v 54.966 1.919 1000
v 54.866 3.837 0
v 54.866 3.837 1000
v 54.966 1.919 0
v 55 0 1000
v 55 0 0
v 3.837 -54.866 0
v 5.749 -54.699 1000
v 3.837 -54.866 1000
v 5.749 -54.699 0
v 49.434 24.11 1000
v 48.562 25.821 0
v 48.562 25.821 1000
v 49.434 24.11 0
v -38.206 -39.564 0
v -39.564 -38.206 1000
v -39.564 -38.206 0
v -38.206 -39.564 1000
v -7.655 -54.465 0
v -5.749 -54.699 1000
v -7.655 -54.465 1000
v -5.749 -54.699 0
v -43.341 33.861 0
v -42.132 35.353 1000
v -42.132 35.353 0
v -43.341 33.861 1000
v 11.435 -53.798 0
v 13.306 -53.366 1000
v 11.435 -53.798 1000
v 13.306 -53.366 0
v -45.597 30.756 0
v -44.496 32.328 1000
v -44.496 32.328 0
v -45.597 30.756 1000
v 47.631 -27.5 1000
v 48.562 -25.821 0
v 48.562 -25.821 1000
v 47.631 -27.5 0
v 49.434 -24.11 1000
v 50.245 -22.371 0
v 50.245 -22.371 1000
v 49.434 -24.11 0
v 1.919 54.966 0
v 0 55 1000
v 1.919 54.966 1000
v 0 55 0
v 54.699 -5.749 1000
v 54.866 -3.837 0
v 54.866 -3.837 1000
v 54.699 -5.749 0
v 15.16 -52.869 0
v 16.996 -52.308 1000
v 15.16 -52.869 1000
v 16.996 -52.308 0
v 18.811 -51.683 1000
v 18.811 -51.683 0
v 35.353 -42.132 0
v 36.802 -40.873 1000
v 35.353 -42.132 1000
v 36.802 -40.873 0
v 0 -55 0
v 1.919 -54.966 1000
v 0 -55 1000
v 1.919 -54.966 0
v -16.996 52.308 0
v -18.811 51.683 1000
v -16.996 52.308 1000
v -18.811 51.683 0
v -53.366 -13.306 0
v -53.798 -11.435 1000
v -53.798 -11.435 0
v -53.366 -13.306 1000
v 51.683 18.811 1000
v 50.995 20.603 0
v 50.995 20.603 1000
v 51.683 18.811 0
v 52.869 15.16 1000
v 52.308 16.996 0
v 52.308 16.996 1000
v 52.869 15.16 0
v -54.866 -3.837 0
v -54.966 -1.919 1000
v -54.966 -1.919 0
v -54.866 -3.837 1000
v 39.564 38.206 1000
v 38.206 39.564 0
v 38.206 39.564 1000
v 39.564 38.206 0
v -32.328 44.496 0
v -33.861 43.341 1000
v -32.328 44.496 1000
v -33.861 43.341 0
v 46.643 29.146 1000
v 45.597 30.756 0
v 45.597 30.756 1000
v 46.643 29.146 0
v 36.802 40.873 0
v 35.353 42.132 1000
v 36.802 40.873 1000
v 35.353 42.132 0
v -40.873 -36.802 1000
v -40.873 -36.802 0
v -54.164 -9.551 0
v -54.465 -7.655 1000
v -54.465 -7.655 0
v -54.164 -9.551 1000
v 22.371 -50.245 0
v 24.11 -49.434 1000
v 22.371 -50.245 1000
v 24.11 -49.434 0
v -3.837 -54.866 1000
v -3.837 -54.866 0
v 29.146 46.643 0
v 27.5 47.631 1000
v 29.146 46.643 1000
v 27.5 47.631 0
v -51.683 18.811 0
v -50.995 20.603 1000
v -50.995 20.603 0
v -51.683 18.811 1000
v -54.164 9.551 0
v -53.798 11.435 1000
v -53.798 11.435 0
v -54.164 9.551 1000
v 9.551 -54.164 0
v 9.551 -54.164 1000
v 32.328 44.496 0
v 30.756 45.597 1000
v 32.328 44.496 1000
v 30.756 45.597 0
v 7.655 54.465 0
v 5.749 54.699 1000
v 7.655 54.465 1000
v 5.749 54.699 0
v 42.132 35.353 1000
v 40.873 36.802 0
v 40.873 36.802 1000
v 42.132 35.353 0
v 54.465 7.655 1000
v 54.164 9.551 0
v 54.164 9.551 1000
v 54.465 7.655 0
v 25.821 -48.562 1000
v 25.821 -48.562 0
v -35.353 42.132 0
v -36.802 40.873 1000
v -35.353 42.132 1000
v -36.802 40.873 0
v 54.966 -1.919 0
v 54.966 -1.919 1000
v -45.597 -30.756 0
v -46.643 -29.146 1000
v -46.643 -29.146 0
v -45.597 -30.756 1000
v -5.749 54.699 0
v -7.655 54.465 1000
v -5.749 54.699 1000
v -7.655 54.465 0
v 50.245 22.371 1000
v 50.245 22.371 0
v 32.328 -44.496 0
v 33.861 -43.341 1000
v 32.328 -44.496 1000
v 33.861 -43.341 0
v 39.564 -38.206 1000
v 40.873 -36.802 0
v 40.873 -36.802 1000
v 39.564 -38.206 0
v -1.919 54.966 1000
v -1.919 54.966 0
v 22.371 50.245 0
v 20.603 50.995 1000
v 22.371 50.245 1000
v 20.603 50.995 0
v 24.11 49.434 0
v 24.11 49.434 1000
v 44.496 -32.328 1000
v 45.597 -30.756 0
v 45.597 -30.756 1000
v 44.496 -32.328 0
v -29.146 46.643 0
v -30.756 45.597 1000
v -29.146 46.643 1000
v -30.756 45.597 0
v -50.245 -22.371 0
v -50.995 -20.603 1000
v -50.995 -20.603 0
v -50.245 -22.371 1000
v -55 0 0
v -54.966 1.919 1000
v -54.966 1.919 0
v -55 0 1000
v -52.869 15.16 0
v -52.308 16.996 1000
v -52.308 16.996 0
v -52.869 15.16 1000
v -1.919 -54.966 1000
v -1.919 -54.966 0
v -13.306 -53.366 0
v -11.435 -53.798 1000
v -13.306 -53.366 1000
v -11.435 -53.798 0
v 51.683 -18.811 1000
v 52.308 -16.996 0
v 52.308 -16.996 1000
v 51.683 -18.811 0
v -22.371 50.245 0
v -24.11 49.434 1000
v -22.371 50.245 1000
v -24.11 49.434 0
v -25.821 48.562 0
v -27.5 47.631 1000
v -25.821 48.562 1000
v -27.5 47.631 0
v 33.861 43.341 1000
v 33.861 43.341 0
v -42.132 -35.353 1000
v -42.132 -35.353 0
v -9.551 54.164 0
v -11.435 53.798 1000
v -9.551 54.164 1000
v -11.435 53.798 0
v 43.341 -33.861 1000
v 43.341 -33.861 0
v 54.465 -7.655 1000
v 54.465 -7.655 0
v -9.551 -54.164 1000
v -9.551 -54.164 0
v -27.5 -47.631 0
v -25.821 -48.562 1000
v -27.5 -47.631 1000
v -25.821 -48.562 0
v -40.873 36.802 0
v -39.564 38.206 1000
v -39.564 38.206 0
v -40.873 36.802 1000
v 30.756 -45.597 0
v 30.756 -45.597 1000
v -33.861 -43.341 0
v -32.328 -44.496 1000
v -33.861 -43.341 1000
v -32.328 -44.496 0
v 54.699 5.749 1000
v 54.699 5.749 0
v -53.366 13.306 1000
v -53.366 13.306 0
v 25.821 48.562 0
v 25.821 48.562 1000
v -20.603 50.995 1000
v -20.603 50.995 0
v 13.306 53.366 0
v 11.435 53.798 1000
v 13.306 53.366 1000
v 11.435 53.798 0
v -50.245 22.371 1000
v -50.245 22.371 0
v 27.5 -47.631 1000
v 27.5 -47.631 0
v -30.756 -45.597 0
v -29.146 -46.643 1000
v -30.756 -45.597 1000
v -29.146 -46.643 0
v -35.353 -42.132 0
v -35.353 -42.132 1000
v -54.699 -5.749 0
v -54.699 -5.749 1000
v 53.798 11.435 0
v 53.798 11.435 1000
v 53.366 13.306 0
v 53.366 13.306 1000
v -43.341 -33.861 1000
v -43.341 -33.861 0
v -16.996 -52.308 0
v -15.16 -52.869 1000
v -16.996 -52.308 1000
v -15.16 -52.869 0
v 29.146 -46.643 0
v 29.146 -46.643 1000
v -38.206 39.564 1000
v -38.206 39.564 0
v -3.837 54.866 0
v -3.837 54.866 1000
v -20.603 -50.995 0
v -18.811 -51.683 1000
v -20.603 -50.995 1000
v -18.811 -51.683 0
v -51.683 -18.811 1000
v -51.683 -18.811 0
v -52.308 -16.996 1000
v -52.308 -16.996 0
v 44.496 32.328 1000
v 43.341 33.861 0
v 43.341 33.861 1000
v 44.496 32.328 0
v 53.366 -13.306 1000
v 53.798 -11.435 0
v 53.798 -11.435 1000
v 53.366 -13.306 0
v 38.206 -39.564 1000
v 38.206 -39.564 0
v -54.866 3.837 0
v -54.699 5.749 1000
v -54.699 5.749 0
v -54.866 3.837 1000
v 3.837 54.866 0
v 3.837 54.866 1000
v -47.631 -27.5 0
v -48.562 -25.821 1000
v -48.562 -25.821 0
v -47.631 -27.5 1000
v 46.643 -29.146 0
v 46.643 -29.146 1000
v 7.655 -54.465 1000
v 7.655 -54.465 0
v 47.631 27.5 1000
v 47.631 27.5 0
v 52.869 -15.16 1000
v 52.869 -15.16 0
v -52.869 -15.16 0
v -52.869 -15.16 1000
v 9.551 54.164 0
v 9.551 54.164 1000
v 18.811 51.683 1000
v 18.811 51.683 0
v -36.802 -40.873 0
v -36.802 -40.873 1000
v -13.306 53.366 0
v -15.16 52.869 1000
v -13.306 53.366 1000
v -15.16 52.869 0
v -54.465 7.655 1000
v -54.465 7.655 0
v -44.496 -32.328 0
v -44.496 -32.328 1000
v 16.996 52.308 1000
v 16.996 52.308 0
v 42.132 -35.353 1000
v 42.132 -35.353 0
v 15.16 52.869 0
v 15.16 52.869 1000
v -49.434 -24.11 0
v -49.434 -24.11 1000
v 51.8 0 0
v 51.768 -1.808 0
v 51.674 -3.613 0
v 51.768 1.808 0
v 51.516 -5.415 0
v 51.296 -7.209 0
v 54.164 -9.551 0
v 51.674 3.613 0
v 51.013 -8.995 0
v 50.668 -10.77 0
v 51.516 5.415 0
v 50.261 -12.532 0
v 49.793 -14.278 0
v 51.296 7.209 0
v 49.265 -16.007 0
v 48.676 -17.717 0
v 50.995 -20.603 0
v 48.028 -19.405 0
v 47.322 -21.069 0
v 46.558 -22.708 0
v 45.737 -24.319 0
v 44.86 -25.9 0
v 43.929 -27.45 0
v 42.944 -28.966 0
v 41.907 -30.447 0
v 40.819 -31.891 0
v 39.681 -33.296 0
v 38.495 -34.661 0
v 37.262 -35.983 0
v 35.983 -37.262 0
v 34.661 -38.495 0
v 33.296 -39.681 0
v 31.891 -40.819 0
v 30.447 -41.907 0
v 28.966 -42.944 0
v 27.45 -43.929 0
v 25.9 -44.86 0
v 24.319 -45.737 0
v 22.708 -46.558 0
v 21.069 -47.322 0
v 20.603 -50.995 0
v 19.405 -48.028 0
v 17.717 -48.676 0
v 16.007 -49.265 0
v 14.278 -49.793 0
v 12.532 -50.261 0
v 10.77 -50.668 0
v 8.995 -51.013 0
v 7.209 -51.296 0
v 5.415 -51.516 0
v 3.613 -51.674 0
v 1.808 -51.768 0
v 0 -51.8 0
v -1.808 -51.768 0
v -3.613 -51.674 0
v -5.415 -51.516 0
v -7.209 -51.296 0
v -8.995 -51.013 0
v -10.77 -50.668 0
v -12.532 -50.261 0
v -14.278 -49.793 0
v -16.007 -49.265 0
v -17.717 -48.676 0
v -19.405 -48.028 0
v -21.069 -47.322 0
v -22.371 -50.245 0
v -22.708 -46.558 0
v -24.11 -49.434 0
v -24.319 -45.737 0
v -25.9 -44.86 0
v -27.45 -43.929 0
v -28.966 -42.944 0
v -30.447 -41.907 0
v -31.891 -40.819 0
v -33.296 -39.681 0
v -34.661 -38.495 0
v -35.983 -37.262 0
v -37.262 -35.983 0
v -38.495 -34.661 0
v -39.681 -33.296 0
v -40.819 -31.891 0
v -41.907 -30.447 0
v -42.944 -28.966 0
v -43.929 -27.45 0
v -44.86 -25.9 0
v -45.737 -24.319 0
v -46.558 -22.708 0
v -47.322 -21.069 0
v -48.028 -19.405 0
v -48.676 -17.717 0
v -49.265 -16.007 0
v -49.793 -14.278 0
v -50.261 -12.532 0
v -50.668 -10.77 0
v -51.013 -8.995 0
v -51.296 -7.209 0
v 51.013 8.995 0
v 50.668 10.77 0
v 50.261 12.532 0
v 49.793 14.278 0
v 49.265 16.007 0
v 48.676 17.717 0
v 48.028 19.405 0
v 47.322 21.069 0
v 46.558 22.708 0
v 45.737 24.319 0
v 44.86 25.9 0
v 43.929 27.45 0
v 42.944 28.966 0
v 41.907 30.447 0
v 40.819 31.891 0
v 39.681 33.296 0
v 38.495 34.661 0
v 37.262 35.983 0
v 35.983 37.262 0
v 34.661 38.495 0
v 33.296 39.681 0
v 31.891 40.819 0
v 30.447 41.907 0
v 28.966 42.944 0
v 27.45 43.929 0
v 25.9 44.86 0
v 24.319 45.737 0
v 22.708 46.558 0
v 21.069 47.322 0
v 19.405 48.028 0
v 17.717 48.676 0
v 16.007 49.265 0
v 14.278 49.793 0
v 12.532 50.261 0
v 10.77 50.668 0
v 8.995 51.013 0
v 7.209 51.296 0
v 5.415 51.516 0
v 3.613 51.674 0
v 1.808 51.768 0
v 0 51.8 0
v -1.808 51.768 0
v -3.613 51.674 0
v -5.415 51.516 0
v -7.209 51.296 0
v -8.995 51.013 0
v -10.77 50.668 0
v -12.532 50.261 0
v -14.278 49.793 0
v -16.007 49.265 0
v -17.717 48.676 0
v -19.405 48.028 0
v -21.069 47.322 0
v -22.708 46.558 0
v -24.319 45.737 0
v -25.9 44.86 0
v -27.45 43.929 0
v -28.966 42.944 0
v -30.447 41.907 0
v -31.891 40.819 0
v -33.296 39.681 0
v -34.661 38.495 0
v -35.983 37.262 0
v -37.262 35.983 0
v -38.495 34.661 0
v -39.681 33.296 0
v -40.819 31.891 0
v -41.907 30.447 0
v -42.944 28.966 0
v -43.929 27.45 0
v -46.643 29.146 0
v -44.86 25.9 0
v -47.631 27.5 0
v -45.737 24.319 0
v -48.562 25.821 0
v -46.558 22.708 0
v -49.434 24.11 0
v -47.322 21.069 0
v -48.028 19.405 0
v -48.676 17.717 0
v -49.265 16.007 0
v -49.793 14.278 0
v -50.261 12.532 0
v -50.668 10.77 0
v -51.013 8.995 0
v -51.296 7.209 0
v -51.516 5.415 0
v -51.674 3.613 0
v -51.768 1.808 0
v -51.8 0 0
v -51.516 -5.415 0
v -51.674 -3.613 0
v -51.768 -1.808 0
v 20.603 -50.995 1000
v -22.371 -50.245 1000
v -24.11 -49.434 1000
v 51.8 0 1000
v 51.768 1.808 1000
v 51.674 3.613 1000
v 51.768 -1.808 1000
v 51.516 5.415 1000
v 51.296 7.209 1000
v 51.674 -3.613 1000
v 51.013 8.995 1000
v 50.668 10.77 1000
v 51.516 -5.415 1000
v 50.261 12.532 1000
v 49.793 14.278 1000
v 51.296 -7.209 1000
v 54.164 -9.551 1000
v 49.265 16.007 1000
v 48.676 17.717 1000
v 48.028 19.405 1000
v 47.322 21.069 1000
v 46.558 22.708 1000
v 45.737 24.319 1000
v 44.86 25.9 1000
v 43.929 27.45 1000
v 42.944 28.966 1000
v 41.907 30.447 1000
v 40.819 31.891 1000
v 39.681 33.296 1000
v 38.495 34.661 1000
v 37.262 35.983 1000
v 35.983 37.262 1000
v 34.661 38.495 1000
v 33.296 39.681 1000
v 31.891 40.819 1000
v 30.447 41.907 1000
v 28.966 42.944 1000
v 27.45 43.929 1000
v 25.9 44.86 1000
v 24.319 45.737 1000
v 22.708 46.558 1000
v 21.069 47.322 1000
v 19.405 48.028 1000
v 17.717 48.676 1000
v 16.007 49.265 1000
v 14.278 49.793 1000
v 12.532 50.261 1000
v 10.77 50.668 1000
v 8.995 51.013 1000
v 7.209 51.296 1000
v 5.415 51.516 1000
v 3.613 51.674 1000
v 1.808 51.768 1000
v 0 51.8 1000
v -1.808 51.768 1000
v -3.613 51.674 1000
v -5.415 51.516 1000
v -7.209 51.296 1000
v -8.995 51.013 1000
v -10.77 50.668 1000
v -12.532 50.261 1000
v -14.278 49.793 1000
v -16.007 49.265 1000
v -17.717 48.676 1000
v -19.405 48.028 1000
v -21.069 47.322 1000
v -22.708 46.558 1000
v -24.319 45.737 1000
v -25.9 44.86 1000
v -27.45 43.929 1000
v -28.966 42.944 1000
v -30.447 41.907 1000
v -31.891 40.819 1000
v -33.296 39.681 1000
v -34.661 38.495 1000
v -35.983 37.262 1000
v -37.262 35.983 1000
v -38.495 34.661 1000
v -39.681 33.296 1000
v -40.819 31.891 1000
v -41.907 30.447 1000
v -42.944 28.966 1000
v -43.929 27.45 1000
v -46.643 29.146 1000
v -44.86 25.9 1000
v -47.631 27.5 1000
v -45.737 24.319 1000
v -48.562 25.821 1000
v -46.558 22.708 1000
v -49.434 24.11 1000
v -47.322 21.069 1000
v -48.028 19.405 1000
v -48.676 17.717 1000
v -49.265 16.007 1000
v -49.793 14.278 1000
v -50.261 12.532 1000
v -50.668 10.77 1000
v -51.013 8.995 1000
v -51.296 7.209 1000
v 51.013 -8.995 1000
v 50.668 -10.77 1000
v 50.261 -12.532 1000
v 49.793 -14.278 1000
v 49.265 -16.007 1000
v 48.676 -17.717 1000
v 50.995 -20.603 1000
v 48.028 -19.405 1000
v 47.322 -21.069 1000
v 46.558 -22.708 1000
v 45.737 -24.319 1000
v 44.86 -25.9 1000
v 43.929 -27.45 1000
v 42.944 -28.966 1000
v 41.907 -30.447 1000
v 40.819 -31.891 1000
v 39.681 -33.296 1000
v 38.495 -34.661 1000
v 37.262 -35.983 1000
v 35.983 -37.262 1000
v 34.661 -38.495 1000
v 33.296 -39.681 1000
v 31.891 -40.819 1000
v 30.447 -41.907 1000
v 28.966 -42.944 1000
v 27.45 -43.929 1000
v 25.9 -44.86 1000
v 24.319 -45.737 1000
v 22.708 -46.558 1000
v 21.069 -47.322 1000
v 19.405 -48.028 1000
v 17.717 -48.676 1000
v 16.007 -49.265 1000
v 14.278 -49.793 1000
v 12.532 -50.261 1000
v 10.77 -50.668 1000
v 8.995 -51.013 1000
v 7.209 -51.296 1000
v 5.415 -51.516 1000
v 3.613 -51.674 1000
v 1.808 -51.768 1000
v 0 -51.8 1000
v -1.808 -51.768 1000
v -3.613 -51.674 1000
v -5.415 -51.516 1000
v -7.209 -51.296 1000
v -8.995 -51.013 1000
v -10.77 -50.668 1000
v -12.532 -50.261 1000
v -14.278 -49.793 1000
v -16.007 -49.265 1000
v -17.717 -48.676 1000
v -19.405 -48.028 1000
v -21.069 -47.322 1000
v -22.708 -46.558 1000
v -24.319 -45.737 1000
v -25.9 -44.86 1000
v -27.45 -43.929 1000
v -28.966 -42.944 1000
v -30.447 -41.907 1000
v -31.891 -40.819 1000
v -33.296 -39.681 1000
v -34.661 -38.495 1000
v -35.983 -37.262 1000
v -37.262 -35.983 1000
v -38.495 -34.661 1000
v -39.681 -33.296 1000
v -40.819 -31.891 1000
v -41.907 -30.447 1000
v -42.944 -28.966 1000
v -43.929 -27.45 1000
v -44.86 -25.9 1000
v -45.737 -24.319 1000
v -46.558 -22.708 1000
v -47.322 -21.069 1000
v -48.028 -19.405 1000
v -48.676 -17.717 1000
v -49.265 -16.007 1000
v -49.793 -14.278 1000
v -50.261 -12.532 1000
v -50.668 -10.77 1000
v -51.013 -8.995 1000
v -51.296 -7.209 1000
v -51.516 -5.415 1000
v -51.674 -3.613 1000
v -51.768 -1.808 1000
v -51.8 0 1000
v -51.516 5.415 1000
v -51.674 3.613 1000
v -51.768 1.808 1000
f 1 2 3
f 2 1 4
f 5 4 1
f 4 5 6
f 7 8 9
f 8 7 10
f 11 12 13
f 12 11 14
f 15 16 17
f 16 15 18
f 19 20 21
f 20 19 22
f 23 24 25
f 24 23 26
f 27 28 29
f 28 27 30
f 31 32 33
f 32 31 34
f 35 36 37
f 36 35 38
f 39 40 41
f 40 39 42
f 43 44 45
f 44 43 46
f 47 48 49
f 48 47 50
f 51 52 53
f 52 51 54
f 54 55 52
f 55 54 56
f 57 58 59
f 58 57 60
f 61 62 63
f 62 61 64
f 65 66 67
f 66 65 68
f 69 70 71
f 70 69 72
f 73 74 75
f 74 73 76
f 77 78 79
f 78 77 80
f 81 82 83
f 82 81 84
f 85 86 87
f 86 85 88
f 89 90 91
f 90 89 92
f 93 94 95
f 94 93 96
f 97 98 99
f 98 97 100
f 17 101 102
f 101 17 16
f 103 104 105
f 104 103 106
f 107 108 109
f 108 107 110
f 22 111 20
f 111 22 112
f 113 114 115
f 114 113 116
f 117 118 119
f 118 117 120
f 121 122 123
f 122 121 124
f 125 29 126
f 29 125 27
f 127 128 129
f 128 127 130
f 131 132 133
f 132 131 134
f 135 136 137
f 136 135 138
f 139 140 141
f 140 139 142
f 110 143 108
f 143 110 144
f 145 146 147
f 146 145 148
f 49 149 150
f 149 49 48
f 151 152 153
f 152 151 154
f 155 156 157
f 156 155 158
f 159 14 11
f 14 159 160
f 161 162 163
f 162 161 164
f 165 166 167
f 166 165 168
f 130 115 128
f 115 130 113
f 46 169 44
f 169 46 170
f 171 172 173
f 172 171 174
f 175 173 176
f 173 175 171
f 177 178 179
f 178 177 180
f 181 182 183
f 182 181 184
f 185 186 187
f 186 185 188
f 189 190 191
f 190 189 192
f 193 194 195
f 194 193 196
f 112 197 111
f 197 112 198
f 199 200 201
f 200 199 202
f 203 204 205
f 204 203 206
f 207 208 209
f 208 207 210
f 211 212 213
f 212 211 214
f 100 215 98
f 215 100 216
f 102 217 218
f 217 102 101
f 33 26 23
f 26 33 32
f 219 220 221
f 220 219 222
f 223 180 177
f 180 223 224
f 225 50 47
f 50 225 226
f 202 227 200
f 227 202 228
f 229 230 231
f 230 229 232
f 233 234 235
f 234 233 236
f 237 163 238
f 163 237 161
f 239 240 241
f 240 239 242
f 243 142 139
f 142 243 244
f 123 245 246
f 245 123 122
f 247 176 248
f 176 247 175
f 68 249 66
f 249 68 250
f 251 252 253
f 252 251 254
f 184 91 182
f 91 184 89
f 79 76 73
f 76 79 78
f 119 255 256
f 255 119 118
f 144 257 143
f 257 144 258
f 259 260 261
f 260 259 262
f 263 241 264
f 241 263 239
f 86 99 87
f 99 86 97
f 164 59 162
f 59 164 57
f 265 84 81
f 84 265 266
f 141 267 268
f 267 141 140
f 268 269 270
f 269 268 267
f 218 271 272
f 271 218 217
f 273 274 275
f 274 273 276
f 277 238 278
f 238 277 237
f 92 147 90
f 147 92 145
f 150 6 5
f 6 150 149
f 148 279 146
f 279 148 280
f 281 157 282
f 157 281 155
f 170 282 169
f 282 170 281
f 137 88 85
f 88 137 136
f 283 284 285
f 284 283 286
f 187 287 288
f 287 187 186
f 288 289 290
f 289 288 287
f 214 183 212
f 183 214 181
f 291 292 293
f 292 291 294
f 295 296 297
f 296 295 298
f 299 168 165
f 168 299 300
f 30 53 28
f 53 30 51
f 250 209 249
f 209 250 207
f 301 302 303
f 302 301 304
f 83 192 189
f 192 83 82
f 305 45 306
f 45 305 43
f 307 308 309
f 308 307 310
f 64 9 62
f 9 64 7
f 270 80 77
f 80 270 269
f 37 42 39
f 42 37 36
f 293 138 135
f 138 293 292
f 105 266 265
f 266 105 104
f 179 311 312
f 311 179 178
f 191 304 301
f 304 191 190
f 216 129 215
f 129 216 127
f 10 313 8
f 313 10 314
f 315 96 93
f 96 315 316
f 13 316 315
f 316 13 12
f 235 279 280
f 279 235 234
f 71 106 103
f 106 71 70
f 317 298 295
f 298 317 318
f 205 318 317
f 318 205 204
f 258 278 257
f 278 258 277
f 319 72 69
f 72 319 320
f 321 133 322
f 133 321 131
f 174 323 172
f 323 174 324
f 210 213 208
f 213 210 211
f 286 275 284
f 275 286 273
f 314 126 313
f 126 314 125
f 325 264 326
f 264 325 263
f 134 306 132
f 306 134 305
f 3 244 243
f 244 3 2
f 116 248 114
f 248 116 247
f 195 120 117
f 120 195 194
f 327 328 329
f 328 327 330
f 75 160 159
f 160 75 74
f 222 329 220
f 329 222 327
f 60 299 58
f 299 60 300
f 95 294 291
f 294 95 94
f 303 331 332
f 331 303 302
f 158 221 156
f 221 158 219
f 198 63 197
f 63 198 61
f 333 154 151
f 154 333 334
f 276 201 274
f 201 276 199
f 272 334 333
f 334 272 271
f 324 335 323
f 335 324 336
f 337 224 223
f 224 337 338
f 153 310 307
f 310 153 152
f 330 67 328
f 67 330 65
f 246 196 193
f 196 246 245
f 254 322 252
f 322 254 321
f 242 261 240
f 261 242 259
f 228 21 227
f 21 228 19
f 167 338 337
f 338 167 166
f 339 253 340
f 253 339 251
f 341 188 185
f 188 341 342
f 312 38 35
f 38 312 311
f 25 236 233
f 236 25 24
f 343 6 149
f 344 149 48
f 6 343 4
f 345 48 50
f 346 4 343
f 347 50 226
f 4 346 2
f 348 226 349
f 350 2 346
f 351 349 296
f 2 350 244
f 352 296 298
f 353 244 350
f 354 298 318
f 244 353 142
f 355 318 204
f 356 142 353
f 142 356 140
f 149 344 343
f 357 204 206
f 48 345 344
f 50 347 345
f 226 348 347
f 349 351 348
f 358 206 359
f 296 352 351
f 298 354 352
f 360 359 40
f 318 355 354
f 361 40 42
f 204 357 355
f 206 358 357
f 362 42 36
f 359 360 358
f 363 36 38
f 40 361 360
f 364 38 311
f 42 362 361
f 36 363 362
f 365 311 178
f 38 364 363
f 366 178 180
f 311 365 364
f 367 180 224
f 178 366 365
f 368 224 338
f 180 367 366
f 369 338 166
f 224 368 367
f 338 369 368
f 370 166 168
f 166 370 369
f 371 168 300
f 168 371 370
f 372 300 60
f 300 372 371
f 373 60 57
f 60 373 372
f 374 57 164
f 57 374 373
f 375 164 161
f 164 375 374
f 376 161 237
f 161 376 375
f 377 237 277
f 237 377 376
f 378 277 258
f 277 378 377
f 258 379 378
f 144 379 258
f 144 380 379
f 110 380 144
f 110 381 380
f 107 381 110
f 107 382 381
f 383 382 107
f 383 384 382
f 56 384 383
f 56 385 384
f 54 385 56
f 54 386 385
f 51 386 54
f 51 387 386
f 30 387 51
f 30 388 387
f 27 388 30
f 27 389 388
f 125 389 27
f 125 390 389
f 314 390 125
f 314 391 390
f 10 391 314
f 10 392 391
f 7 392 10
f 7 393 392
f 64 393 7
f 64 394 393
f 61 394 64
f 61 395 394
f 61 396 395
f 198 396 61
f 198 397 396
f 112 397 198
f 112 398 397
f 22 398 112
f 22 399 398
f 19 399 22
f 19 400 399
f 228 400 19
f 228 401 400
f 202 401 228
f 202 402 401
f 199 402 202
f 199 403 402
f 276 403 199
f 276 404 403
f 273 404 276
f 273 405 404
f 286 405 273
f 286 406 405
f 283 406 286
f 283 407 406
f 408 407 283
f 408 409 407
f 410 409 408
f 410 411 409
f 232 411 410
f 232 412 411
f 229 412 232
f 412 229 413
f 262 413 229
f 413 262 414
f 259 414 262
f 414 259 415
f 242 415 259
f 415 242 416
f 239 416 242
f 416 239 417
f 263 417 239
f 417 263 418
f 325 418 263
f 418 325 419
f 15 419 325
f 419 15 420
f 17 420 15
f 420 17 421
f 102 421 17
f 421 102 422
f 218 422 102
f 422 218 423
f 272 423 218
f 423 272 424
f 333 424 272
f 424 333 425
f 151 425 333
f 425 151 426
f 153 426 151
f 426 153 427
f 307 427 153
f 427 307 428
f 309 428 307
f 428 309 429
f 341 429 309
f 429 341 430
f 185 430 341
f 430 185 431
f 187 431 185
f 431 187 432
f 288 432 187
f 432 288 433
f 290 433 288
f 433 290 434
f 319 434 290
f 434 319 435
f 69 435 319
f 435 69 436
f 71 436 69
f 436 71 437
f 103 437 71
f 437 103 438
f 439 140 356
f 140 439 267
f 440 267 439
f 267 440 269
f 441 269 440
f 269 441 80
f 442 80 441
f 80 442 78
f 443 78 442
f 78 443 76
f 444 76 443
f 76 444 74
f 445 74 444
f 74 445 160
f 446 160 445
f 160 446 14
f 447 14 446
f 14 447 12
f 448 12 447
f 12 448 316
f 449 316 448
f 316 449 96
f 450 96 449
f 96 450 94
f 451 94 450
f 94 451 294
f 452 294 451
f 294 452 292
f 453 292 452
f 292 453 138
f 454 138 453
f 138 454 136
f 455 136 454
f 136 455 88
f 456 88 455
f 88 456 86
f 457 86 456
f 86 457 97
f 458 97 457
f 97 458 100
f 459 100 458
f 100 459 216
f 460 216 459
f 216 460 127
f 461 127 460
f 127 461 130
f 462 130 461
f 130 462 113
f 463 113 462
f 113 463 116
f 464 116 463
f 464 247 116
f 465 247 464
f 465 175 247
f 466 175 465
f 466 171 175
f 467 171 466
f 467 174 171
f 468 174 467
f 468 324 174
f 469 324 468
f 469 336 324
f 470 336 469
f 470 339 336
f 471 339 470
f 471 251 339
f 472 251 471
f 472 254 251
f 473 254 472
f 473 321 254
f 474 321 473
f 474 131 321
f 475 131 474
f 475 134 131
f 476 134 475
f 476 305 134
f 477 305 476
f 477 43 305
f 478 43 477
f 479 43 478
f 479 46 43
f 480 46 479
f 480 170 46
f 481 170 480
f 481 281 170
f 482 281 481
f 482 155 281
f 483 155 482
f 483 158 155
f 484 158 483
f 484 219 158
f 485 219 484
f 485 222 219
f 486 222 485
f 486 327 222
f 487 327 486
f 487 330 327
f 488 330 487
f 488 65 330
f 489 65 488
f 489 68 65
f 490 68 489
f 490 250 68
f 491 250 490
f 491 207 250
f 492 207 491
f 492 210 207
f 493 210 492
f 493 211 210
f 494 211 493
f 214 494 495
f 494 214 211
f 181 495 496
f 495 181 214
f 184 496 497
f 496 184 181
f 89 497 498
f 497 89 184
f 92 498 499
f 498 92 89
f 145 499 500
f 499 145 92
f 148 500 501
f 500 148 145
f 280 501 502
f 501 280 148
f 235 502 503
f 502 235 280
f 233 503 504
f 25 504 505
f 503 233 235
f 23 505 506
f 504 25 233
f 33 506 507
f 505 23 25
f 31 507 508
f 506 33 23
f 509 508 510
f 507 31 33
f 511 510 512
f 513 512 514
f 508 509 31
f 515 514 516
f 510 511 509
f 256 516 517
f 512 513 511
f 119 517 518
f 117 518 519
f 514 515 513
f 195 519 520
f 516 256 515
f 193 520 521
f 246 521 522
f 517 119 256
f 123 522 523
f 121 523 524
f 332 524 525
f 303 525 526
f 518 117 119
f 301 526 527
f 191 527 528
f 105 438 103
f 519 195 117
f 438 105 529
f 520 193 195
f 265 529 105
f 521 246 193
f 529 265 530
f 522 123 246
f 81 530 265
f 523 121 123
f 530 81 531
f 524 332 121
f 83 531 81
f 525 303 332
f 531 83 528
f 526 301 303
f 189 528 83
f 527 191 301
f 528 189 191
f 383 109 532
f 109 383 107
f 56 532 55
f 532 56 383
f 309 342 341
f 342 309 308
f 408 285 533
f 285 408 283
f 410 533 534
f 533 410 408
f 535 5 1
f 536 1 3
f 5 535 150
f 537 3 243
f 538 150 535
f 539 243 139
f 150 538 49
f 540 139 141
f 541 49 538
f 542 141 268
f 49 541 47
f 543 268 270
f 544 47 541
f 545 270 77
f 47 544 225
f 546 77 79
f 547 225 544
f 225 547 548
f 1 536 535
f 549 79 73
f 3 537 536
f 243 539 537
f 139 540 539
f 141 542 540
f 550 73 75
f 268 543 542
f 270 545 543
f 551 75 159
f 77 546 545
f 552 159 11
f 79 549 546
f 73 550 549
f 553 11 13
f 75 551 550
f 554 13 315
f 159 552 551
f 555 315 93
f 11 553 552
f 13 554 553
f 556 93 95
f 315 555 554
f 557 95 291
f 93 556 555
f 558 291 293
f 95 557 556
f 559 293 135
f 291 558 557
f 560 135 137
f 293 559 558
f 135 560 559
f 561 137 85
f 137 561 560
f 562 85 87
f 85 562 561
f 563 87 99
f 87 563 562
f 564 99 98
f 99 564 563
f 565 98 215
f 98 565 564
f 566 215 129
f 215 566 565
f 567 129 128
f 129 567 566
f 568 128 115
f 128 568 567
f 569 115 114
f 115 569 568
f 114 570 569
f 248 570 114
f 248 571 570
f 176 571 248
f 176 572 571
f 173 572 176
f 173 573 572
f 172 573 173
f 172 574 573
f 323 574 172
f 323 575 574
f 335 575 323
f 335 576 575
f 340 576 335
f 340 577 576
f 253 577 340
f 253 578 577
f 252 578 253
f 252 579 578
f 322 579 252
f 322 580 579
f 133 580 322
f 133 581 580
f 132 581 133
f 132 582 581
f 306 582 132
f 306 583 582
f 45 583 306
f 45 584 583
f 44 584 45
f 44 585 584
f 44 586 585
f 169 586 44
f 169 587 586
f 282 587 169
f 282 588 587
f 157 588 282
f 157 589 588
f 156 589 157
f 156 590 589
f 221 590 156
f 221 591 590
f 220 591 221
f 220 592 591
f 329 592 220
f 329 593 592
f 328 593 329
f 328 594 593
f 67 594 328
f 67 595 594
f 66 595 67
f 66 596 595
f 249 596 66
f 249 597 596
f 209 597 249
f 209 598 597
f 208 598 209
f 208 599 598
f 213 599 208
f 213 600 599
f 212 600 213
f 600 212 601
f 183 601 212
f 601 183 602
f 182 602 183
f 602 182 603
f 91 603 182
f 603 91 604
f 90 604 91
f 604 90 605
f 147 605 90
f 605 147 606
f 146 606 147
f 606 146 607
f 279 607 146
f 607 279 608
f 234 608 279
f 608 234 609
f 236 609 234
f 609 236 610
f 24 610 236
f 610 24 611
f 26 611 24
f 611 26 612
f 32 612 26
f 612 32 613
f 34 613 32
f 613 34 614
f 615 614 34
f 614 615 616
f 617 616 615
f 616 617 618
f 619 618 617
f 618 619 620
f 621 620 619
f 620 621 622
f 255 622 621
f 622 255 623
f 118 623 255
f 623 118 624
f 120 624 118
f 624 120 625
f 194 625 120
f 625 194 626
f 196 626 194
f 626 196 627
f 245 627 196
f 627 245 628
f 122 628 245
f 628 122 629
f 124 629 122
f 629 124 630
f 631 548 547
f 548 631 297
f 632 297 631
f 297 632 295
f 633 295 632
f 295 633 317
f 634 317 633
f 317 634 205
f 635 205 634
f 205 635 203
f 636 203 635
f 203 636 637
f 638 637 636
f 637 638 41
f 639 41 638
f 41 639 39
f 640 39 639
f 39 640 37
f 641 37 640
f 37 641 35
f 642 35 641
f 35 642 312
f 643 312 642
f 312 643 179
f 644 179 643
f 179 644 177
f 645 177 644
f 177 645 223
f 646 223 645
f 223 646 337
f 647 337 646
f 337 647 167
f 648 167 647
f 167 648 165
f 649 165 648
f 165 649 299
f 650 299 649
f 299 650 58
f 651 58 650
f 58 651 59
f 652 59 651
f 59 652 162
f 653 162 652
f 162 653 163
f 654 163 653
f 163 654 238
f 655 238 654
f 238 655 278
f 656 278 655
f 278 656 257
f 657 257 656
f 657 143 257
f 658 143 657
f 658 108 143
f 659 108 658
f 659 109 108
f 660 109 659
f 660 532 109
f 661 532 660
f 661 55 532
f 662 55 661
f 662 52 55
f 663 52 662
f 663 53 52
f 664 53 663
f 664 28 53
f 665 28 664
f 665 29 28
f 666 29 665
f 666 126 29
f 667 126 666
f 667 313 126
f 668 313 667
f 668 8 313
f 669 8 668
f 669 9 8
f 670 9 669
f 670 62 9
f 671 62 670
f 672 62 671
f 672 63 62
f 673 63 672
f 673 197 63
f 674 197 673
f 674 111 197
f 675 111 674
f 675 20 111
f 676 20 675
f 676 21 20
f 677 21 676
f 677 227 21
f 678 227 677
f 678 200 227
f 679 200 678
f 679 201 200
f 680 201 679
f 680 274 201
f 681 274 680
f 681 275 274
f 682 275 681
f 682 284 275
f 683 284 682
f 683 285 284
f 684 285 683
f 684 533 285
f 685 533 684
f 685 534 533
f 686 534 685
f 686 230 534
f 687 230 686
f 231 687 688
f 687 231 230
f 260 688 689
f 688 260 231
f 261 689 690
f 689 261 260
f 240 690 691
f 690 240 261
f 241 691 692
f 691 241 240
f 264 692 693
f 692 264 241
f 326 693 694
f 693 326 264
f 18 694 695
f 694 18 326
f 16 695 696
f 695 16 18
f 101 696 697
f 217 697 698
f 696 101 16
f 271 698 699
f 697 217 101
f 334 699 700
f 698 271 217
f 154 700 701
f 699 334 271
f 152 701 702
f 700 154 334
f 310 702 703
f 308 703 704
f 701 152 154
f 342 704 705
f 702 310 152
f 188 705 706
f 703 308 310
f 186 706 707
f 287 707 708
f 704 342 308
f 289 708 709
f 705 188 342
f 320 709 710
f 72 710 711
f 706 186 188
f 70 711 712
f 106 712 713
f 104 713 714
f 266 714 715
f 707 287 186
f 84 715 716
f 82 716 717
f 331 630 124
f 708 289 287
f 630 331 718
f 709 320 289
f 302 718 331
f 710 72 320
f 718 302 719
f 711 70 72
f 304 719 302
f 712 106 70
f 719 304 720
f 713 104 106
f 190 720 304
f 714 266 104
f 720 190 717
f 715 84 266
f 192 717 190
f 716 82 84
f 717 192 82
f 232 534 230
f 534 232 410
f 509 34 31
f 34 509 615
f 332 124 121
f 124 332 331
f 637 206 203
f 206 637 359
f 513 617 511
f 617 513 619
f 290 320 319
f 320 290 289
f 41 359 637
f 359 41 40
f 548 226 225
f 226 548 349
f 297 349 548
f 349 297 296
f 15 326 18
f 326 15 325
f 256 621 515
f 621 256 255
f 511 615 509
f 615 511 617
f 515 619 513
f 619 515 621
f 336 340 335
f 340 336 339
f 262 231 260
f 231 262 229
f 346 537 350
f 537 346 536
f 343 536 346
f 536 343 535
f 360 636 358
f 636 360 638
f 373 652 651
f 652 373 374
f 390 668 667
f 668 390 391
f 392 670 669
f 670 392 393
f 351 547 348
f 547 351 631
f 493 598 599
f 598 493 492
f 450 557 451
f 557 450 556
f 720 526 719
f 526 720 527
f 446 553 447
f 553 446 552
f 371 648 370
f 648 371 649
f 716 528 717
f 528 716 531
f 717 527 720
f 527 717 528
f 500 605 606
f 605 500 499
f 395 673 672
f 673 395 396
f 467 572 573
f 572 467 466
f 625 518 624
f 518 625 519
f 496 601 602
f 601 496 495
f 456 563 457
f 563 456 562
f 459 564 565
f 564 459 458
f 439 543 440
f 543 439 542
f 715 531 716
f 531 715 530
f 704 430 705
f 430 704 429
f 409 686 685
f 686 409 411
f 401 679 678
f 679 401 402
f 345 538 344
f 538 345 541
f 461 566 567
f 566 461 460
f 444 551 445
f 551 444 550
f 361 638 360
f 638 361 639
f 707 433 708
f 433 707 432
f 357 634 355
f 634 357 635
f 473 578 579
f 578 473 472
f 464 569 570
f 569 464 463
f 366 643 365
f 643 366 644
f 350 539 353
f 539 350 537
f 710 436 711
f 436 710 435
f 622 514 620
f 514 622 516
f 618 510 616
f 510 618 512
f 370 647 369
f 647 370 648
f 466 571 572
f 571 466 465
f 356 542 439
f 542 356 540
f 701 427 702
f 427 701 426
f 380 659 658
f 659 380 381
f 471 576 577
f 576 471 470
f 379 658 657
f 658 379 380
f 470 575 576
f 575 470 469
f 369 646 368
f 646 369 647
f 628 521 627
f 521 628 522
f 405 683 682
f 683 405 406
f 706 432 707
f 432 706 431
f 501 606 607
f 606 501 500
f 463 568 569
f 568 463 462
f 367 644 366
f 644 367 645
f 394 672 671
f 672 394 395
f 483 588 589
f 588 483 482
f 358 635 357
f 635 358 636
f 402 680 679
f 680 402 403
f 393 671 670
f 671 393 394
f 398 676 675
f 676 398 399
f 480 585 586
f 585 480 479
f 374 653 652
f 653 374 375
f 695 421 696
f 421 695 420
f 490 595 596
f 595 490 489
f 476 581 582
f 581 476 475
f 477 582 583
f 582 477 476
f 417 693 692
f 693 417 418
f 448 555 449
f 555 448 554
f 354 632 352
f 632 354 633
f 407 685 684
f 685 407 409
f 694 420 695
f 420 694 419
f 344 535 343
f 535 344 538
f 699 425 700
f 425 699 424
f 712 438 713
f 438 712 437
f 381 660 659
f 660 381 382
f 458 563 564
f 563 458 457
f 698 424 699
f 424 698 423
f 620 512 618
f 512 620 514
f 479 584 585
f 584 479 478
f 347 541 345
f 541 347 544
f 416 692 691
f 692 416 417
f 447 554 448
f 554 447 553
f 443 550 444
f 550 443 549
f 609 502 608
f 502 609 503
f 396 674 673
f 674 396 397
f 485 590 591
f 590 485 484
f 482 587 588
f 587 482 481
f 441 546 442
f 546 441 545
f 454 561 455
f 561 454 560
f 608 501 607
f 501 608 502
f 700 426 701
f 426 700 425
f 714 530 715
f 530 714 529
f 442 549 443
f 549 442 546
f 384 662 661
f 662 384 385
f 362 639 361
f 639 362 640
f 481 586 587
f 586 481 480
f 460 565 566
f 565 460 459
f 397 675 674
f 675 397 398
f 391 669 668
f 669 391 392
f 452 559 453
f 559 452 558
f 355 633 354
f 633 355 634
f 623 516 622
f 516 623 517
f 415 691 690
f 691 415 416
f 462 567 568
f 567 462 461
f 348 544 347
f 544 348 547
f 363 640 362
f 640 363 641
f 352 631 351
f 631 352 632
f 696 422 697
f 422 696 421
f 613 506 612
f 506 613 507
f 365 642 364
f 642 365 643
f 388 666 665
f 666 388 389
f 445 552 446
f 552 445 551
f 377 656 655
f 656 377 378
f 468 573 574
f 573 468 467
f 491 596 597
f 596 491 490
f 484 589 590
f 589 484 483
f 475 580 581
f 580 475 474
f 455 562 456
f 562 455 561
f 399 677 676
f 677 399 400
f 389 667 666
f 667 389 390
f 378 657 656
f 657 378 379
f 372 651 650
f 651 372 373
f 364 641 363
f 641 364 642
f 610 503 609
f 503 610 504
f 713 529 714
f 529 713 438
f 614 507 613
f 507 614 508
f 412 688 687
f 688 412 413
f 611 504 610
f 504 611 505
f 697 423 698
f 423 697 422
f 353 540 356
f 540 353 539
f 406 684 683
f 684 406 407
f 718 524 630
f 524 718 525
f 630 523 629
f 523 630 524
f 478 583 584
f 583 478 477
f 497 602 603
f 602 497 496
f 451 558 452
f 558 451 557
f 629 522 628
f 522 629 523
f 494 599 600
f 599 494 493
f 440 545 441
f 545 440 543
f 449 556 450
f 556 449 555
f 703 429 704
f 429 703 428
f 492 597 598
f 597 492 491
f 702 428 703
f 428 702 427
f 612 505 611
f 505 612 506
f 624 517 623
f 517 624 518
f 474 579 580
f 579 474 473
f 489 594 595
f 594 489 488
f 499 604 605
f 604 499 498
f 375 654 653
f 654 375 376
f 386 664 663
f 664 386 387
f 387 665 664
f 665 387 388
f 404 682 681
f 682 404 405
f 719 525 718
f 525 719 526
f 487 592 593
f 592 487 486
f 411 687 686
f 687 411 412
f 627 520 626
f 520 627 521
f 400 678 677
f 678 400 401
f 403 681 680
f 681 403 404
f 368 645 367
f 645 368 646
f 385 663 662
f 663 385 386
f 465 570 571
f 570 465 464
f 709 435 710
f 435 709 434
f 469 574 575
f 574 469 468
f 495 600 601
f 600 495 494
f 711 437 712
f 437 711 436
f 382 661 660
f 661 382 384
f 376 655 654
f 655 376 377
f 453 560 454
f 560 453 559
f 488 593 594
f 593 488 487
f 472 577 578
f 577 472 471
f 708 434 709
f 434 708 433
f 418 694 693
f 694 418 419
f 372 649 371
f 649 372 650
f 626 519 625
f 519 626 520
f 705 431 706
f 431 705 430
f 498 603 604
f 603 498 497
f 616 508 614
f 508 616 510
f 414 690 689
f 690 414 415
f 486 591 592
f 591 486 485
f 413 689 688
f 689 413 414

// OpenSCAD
$fn = 180;

// HT pipe parameters (approximate for HT 110)
pipe_length = 1000;          // mm
outer_diameter = 110;        // mm
wall_thickness = 3.2;        // mm (typical for HT 110)
inner_diameter = outer_diameter - 2*wall_thickness;

module ht_pipe(od, id, len) {
    difference() {
        cylinder(h = len, d = od, center = false);
        translate([0,0,-0.5])
            cylinder(h = len + 1, d = id, center = false);
    }
}

ht_pipe(outer_diameter, inner_diameter, pipe_length);
